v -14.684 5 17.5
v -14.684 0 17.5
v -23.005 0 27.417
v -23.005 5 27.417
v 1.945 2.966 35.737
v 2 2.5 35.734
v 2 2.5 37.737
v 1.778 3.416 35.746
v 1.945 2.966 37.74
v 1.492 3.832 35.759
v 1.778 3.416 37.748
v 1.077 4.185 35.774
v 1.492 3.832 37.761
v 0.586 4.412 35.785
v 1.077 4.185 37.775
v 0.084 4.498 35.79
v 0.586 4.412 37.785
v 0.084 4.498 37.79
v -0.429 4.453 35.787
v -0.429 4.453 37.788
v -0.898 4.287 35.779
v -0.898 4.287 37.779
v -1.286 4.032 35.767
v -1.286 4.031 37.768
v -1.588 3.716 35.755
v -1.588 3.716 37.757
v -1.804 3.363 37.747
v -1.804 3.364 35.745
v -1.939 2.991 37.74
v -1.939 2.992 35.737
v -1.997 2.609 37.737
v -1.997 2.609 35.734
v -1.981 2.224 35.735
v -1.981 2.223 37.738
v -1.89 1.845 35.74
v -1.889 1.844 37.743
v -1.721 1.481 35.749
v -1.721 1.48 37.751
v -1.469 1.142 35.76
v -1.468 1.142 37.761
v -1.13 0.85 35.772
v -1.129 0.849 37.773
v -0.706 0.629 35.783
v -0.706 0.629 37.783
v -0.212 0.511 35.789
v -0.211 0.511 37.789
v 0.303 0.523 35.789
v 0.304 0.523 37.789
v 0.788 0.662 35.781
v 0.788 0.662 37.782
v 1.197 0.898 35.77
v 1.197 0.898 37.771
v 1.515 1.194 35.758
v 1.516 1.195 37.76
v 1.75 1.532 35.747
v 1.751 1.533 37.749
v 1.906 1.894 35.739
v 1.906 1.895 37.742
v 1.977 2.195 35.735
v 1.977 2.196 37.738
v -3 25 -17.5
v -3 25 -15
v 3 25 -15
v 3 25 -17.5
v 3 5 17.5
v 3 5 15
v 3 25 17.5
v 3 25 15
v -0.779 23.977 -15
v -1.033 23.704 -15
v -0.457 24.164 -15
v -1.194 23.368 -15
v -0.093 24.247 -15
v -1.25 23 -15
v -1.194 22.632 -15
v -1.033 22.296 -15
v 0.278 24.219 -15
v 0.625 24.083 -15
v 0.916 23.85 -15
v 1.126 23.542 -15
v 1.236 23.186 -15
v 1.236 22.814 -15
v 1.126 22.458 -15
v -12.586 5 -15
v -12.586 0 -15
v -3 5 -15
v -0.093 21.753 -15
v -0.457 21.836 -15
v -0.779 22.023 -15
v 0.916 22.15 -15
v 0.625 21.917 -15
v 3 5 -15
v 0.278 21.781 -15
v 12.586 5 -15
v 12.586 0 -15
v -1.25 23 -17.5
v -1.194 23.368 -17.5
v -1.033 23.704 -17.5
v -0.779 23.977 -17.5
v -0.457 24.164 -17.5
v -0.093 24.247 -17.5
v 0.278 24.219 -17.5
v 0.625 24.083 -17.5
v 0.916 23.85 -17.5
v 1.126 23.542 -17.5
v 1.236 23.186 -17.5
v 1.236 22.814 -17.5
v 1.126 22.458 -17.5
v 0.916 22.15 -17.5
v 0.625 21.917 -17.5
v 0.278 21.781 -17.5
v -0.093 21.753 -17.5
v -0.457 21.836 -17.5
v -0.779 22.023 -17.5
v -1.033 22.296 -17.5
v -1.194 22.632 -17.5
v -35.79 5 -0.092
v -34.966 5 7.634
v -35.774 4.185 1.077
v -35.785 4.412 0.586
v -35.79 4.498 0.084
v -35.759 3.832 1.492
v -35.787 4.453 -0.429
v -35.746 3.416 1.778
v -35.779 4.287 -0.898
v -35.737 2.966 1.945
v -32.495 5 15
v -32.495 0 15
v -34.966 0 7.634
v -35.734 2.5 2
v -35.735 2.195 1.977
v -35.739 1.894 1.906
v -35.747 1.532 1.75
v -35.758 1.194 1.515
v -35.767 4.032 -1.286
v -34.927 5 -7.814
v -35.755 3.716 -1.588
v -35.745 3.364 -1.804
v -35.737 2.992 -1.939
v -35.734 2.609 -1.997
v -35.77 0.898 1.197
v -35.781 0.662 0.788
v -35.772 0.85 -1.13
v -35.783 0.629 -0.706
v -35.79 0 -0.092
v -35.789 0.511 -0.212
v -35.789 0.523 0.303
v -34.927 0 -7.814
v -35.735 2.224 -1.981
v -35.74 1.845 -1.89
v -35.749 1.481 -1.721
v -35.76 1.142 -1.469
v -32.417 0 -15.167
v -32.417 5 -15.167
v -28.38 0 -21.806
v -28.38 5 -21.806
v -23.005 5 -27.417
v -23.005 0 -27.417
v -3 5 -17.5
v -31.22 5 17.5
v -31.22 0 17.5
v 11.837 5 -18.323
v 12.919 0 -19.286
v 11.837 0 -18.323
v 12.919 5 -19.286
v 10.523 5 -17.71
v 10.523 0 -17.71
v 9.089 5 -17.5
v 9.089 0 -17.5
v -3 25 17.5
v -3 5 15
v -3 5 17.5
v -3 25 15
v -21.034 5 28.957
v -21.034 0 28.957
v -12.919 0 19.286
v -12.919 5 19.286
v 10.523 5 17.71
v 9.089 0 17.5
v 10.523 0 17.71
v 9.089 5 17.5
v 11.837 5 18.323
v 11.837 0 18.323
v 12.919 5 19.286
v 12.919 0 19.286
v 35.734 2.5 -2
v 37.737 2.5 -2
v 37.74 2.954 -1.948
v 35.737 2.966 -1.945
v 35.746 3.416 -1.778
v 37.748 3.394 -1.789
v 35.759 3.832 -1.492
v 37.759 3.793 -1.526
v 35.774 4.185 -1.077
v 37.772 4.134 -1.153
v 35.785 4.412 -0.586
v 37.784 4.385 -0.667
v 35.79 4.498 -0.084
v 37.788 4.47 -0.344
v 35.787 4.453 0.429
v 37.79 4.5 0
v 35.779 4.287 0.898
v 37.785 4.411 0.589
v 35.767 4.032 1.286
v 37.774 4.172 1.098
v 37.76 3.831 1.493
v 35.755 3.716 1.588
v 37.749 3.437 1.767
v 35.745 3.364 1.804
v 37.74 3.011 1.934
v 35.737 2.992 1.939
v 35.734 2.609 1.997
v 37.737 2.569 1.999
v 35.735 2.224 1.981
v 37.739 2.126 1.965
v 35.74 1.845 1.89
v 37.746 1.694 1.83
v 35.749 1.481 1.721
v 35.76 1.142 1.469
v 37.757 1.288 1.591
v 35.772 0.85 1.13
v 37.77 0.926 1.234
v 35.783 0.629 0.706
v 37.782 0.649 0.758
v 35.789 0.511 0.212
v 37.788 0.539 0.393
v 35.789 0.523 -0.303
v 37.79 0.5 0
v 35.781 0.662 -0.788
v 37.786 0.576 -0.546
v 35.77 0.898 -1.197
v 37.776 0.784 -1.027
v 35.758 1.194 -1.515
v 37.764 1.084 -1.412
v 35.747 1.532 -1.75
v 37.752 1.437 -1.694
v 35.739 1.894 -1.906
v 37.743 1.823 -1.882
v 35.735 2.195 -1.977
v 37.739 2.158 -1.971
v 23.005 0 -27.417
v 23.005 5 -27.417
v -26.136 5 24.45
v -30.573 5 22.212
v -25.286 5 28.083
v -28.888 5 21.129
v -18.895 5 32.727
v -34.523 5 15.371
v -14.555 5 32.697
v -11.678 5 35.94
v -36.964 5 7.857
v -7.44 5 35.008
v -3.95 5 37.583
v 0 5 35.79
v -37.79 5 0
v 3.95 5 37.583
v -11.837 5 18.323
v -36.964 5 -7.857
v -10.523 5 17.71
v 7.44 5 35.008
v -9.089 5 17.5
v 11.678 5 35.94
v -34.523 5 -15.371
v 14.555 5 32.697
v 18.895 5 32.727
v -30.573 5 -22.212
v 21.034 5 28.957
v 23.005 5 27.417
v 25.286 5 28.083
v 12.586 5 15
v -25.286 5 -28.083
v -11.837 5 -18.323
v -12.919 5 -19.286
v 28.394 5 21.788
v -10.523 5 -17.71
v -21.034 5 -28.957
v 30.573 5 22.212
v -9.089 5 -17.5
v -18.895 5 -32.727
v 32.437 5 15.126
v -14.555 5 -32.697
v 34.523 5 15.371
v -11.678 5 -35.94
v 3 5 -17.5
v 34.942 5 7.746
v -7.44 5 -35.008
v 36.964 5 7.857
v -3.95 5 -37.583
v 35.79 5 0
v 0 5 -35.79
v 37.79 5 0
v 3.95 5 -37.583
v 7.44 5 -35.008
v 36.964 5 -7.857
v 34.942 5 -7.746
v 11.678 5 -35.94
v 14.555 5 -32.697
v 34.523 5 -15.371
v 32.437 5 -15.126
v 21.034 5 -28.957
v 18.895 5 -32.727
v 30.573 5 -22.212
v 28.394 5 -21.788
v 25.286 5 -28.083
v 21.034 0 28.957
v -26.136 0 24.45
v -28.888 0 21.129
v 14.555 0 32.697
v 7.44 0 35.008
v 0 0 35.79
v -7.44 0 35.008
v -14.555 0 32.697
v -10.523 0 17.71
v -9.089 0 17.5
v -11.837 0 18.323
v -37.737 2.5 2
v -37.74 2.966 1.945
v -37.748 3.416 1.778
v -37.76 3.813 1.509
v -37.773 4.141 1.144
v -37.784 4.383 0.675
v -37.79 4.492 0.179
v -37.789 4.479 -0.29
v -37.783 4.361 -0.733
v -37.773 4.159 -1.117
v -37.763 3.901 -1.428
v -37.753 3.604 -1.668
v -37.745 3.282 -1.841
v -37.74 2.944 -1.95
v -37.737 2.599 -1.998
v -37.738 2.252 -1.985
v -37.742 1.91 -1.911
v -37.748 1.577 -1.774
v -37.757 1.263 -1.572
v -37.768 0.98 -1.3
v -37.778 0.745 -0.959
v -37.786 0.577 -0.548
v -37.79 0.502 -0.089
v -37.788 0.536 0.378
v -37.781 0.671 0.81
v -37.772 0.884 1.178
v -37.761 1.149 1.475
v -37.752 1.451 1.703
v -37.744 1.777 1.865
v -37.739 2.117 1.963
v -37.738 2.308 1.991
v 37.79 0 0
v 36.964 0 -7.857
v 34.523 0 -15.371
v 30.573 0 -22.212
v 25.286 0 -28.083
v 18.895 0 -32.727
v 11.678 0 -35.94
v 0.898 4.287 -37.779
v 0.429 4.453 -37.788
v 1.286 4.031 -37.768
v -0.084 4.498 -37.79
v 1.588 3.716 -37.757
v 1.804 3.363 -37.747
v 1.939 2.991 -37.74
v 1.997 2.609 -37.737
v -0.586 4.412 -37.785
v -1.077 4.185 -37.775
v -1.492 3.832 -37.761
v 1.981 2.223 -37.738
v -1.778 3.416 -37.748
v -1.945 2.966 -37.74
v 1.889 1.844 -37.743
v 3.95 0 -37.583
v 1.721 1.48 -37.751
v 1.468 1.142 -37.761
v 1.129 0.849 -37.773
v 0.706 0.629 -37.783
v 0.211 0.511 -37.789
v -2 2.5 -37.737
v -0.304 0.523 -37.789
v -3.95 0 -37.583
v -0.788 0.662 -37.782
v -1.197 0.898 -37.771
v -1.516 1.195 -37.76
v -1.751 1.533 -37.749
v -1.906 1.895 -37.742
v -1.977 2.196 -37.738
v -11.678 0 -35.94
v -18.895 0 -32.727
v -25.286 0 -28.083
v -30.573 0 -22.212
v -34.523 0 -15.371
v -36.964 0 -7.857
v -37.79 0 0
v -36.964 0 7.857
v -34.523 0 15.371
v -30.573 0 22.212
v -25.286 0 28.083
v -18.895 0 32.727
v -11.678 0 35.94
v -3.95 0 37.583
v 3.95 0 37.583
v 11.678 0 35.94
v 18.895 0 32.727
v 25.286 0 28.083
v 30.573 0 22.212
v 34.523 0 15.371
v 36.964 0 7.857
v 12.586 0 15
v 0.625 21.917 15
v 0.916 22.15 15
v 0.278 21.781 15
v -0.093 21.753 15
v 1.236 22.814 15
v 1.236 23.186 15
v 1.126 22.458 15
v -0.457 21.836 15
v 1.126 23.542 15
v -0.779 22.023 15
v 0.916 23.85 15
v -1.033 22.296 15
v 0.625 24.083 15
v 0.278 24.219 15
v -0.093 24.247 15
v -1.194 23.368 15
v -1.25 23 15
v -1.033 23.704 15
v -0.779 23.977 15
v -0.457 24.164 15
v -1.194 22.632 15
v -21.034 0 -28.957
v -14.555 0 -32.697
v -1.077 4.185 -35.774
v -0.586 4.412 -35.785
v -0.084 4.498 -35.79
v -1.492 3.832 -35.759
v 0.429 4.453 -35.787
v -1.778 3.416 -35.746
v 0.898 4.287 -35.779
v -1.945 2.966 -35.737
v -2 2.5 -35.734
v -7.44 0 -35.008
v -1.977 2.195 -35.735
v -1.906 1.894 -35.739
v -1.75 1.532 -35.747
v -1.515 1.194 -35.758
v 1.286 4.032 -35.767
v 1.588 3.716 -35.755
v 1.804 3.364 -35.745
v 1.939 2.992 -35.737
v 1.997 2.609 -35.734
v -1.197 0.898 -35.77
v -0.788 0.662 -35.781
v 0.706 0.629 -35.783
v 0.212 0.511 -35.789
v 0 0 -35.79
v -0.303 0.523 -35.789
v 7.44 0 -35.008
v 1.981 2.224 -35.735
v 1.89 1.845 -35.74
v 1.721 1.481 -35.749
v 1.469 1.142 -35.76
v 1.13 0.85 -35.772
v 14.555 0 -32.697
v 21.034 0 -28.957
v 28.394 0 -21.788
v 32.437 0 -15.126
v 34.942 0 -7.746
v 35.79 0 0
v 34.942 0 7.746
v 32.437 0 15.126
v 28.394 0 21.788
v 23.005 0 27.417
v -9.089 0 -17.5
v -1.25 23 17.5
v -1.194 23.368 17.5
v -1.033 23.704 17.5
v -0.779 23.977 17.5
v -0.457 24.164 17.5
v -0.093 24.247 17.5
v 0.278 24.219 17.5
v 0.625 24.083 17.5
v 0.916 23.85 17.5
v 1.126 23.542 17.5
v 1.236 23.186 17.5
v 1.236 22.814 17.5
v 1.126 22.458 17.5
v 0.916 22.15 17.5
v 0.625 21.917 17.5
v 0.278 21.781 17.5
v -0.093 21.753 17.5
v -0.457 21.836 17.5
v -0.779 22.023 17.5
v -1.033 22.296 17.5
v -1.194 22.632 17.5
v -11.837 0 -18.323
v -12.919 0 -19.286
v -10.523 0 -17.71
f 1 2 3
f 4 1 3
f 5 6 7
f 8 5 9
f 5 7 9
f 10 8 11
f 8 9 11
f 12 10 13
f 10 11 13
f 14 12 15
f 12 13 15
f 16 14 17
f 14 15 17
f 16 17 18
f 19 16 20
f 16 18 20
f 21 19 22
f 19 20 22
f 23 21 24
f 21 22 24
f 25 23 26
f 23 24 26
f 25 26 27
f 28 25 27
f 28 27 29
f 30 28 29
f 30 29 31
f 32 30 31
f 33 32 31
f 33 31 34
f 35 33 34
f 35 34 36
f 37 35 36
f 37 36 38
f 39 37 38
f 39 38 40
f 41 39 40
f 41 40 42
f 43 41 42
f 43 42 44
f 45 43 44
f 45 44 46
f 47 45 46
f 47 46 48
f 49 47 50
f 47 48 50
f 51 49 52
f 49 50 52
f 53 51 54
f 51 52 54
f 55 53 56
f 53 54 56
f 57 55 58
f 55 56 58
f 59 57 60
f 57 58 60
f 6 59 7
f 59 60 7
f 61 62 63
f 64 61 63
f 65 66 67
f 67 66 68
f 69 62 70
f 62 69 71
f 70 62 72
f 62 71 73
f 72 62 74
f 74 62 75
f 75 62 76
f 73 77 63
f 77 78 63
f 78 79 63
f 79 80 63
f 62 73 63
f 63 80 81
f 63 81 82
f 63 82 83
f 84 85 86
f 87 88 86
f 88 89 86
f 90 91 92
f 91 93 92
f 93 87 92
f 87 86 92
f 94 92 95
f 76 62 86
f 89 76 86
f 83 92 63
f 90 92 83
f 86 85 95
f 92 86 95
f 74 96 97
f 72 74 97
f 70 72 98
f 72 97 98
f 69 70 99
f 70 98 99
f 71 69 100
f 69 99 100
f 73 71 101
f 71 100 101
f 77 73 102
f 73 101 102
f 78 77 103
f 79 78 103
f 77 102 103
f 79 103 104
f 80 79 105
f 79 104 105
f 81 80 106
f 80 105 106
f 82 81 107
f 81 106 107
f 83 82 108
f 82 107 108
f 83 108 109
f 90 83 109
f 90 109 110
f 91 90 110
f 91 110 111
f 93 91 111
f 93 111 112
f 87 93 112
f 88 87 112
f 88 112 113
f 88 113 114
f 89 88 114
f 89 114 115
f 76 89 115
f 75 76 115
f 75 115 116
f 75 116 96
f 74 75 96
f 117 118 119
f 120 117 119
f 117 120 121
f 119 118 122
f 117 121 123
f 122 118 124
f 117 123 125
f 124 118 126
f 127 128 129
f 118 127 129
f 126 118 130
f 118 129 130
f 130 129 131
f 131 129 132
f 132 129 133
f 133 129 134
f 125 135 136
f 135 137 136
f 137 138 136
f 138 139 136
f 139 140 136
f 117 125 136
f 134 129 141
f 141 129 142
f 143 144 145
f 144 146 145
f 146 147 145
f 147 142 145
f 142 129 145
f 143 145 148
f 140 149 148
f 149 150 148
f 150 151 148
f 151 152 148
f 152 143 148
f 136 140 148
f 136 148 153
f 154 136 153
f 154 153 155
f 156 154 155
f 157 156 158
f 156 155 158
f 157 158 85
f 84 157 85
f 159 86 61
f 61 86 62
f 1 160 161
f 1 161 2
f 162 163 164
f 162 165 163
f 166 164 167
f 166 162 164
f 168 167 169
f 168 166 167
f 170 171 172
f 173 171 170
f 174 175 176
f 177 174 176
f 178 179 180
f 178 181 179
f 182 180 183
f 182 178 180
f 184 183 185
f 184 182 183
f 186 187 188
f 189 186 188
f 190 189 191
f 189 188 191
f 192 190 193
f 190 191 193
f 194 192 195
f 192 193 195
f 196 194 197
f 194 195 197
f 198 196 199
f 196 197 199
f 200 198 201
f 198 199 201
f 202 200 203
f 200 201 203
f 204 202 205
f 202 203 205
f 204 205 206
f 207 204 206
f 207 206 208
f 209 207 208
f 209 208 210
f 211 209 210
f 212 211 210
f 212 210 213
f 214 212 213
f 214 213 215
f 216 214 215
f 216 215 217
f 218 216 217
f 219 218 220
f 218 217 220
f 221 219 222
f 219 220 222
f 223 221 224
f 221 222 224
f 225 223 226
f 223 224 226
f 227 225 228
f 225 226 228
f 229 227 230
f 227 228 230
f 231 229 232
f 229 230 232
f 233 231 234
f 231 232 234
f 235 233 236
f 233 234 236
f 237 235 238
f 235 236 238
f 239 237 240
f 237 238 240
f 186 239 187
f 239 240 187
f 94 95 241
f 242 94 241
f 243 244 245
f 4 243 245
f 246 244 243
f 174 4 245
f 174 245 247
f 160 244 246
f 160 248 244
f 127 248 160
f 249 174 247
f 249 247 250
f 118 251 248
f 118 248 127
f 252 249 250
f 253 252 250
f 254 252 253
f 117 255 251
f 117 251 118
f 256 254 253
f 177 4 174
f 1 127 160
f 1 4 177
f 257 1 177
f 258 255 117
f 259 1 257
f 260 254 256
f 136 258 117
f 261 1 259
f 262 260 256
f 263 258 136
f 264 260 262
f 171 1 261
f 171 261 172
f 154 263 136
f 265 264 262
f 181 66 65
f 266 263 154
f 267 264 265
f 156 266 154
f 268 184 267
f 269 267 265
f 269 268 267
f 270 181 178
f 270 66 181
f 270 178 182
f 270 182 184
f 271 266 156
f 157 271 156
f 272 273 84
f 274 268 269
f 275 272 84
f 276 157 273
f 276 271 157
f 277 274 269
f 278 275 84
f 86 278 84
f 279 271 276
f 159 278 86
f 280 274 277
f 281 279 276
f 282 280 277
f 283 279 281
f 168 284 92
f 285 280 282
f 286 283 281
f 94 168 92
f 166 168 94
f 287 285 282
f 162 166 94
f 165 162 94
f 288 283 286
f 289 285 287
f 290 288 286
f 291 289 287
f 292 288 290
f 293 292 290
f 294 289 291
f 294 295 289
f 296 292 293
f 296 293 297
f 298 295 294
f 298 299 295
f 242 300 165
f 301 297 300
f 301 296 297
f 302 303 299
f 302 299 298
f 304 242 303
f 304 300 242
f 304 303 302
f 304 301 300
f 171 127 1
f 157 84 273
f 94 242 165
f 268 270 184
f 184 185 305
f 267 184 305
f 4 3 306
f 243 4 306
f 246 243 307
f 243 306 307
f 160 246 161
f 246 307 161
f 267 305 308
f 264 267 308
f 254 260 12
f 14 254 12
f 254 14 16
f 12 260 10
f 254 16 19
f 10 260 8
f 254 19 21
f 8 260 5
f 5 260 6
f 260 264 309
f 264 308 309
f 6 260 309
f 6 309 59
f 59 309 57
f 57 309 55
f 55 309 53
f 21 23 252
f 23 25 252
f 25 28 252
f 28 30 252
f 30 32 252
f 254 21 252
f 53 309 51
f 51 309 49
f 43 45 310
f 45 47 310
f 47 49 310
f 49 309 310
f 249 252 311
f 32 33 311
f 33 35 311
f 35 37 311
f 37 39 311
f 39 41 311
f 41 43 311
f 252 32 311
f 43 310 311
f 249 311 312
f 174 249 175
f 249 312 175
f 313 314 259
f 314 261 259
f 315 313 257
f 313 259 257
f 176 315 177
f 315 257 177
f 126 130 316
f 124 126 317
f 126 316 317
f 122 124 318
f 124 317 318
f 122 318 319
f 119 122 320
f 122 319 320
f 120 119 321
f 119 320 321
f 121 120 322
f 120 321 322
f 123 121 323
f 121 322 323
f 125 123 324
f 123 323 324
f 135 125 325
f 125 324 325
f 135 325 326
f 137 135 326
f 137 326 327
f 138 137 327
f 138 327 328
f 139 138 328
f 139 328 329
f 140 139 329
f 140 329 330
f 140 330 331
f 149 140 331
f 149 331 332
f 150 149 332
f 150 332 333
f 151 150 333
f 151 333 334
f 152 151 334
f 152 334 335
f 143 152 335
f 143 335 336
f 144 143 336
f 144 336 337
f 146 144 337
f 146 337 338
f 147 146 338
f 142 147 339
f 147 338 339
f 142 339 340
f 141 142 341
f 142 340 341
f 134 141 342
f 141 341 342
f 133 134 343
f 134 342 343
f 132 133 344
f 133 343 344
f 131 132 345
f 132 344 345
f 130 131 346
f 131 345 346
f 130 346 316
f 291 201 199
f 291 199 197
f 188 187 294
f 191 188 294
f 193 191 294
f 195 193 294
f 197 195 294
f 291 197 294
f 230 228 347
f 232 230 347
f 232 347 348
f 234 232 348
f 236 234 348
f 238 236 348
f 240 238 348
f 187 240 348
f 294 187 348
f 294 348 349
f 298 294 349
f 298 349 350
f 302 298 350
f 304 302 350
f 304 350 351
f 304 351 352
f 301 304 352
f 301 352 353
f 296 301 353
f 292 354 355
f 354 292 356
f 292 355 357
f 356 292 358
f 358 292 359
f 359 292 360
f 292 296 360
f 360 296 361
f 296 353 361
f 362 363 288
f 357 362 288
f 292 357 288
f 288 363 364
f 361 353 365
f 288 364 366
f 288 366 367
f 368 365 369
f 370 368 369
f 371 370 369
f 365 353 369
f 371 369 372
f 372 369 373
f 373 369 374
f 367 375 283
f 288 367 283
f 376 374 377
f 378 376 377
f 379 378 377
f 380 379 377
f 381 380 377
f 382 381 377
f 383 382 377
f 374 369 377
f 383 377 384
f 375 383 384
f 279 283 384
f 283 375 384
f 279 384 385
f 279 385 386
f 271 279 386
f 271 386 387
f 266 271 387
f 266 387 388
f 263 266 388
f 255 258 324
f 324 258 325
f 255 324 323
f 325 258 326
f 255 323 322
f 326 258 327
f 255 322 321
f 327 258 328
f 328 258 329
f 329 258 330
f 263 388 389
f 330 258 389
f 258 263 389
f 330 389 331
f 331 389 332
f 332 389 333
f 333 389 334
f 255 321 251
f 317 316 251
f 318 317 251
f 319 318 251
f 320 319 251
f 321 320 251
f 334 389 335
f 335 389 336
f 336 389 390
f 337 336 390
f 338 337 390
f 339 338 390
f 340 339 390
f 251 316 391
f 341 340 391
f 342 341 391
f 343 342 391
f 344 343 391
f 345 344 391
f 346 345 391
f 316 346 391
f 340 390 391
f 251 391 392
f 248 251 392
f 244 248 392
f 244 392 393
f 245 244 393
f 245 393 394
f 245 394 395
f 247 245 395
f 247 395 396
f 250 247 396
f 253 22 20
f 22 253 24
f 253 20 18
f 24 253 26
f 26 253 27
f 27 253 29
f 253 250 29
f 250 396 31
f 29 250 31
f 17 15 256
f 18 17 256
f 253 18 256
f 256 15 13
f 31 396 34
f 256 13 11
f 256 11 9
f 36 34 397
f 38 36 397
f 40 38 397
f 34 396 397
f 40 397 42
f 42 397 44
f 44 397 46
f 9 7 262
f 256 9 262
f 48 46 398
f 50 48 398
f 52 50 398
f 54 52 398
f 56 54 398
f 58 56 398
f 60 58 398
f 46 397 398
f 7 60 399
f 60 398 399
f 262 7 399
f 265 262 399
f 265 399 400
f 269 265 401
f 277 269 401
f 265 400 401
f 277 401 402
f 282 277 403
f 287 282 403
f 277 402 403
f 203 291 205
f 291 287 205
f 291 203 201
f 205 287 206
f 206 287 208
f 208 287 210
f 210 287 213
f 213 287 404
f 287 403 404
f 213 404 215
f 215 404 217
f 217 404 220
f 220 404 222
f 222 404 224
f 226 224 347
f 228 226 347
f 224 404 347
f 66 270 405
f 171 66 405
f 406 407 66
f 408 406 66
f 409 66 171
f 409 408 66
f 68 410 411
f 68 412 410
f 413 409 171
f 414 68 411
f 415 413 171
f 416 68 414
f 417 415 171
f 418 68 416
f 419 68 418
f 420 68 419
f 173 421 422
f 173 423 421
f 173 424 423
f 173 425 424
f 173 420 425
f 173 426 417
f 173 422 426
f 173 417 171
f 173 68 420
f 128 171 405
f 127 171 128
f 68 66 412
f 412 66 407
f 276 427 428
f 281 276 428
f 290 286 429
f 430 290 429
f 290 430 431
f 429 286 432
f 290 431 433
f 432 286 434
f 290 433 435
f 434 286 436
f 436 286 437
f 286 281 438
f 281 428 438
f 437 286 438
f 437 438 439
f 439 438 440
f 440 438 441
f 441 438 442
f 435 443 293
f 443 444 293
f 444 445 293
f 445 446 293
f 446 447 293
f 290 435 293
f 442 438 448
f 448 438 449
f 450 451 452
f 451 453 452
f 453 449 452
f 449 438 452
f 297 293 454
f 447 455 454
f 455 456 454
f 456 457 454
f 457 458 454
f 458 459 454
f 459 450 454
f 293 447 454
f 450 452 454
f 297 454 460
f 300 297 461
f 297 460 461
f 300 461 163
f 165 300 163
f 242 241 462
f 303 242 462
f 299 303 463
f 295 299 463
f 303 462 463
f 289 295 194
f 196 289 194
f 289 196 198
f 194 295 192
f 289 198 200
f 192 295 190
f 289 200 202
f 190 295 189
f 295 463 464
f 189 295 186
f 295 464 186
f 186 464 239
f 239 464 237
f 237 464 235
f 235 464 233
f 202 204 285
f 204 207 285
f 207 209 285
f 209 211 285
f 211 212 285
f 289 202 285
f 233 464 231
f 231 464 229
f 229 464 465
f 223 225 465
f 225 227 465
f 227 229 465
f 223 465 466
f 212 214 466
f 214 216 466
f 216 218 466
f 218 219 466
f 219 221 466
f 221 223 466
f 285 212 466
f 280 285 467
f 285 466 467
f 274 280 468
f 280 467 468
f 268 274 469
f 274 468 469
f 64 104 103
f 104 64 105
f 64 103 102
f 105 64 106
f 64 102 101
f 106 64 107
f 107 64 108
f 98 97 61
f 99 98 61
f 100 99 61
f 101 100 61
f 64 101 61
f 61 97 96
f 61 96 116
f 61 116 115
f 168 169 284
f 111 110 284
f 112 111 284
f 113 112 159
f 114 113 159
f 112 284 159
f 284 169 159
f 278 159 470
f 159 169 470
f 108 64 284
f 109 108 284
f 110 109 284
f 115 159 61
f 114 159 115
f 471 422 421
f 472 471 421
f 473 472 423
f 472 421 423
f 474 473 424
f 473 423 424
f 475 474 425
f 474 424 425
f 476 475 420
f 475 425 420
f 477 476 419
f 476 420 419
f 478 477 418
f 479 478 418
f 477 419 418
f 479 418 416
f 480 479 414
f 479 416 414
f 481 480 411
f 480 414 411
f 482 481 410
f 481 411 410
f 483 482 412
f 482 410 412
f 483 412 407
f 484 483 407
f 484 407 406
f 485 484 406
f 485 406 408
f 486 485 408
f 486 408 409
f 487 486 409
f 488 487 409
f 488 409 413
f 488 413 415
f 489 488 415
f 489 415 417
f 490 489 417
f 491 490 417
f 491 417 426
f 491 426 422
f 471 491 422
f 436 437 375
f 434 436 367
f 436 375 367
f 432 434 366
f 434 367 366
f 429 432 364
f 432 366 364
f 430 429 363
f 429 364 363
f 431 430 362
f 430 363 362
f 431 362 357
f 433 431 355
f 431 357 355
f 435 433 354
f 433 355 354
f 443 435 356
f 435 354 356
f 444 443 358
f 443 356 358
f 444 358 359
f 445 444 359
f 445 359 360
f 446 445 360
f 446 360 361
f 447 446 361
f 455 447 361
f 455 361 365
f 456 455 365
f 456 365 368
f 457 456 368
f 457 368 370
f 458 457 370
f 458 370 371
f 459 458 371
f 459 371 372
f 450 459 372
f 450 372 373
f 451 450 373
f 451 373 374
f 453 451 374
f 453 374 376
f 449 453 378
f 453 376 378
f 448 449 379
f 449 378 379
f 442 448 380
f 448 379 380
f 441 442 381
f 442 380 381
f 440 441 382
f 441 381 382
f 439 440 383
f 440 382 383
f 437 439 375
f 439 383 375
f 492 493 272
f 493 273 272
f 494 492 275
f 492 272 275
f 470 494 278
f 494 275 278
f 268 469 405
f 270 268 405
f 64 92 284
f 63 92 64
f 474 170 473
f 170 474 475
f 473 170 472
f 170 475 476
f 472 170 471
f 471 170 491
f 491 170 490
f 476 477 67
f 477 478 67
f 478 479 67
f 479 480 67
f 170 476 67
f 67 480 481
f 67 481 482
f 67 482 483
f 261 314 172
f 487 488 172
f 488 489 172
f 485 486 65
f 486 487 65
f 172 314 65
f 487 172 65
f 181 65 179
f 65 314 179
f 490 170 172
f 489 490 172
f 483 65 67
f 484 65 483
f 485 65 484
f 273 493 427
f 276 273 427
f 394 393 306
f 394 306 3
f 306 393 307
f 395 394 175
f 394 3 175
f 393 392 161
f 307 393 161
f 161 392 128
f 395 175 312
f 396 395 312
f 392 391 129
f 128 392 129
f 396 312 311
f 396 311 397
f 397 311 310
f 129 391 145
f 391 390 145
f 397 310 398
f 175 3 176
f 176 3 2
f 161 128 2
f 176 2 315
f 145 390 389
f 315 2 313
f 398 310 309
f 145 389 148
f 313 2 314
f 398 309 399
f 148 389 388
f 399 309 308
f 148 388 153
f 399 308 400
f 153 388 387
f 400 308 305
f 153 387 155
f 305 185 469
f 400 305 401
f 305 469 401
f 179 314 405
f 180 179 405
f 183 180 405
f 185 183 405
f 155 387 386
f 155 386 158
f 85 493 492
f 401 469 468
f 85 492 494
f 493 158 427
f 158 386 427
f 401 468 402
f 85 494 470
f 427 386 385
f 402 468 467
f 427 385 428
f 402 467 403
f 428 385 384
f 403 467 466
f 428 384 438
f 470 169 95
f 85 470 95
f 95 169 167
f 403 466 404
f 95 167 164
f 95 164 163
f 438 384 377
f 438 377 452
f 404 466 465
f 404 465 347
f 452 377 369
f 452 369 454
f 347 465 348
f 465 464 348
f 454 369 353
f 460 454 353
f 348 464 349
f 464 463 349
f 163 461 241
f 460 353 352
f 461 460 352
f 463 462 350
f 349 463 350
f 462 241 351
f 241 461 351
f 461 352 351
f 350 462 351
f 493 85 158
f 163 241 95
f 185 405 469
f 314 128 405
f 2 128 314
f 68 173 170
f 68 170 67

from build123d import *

# Parameters (mm, degrees)
CROQUIS2_R                 = 37.79
SALIENTE_EXTRUIR1_DEPTH    = 5
CROQUIS4_W                 = 6
CROQUIS4_H                 = 25
SALIENTE_EXTRUIR3_DEPTH    = 2.5
CROQUIS5_R                 = 1.25
CORTAR_EXTRUIR1_DEPTH      = 21.29
CORTAR_EXTRUIR1_DEPTH_BACK = 56.29
REDONDEO1_R                = 5
CORTAR_EXTRUIR2_START      = 50
CROQUIS6_R                 = 2
CORTAR_EXTRUIR2_DEPTH      = 17
MATRIZC1_COUNT             = 4
SALIENTE_EXTRUIR5_DEPTH    = 5


with BuildPart() as part:
    # Croquis2 → Saliente-Extruir1 (new body)
    with BuildSketch(Plane(origin=(0, 0, 0), x_dir=(1, 0, 0), z_dir=(0, 1, 0))):
        Circle(CROQUIS2_R)
        with BuildLine():
            Line((-12.586494468, 15), (12.586494468, 15))
            Line((12.586494468, 15), (23.005368551, 27.416730619))
            ThreePointArc((23.005368551, 27.416730619), (35.79, 0), (23.005368551, -27.416730619))
            Line((23.005368551, -27.416730619), (12.586494468, -15))
            Line((12.586494468, -15), (-12.586494468, -15))
            Line((-12.586494468, -15), (-23.005368551, -27.416730619))
            ThreePointArc((-23.005368551, -27.416730619), (-35.79, 0), (-23.005368551, 27.416730619))
            Line((-23.005368551, 27.416730619), (-12.586494468, 15))
        make_face(mode=Mode.SUBTRACT)
        with BuildLine():
            Line((-11.420725322, 17.5), (-21.034063882, 28.956730765))
            ThreePointArc((-21.034063882, 28.956730765), (0, 35.79), (21.034063882, 28.956730765))
            Line((21.034063882, 28.956730765), (11.420725322, 17.5))
            Line((11.420725322, 17.5), (-11.420725322, 17.5))
        make_face(mode=Mode.SUBTRACT)
        with BuildLine():
            ThreePointArc((21.034063882, -28.956730765), (0, -35.79), (-21.034063882, -28.956730765))
            Line((-21.034063882, -28.956730765), (-11.420725322, -17.5))
            Line((-11.420725322, -17.5), (11.420725322, -17.5))
            Line((11.420725322, -17.5), (21.034063882, -28.956730765))
        make_face(mode=Mode.SUBTRACT)
    extrude(amount=SALIENTE_EXTRUIR1_DEPTH)

    # Croquis4 → Saliente-Extruir3 (add)
    with BuildSketch(Plane.XY.offset(15)):
        with Locations((0, 12.5)):
            Rectangle(CROQUIS4_W, CROQUIS4_H)
    saliente_extruir3 = extrude(amount=SALIENTE_EXTRUIR3_DEPTH)

    # Simetría1: Saliente-Extruir3 across plane
    add(saliente_extruir3.mirror(Plane.XY))

    # Croquis5 → Cortar-Extruir1 (cut, two sides)
    with BuildSketch(Plane(origin=(0, 0, -17.5), x_dir=(-1, 0, 0), z_dir=(0, 0, -1))) as cortar_extruir1_sk:
        with Locations((0, 23)):
            Circle(CROQUIS5_R)
    extrude(amount=CORTAR_EXTRUIR1_DEPTH, mode=Mode.SUBTRACT)
    extrude(cortar_extruir1_sk.sketch, amount=-CORTAR_EXTRUIR1_DEPTH_BACK, mode=Mode.SUBTRACT)

    # Redondeo1
    redondeo1_edges = [part.edges().sort_by_distance(p)[0] for p in [
        (-11.420725322, 2.5, -17.5),
        (11.420725322, 2.5, -17.5),
        (11.420725322, 2.5, 17.5),
        (-11.420725322, 2.5, 17.5),
    ]]
    fillet(redondeo1_edges, radius=REDONDEO1_R)

    # Croquis6 → Cortar-Extruir2 (cut)
    with BuildSketch(Plane.XY.offset(CORTAR_EXTRUIR2_START)):
        with Locations((0, 2.5)):
            Circle(CROQUIS6_R)
    cortar_extruir2 = extrude(amount=-CORTAR_EXTRUIR2_DEPTH, mode=Mode.SUBTRACT)

    # MatrizC1: Cortar-Extruir2 ×4 about axis
    matrizc1_axis = Axis((0, 0, 0), (0, -1, 0))
    for i in range(1, MATRIZC1_COUNT):
        add(cortar_extruir2.rotate(matrizc1_axis, i * 360 / MATRIZC1_COUNT), mode=Mode.SUBTRACT)

    # Croquis8 → Saliente-Extruir5 (add)
    with BuildSketch(Plane(origin=(0, 5, 0), x_dir=(1, 0, 0), z_dir=(0, 1, 0))):
        with BuildLine():
            Line((-14.684243546, -17.5), (-12.586494468, -15))
            Line((-12.586494468, -15), (-32.494985767, -15))
            ThreePointArc((-32.494985767, -15), (-31.881892303, -16.26250421), (-31.219770979, -17.5))
            Line((-31.219770979, -17.5), (-14.684243546, -17.5))
        make_face()
    extrude(amount=-SALIENTE_EXTRUIR5_DEPTH)


solid = part.part
